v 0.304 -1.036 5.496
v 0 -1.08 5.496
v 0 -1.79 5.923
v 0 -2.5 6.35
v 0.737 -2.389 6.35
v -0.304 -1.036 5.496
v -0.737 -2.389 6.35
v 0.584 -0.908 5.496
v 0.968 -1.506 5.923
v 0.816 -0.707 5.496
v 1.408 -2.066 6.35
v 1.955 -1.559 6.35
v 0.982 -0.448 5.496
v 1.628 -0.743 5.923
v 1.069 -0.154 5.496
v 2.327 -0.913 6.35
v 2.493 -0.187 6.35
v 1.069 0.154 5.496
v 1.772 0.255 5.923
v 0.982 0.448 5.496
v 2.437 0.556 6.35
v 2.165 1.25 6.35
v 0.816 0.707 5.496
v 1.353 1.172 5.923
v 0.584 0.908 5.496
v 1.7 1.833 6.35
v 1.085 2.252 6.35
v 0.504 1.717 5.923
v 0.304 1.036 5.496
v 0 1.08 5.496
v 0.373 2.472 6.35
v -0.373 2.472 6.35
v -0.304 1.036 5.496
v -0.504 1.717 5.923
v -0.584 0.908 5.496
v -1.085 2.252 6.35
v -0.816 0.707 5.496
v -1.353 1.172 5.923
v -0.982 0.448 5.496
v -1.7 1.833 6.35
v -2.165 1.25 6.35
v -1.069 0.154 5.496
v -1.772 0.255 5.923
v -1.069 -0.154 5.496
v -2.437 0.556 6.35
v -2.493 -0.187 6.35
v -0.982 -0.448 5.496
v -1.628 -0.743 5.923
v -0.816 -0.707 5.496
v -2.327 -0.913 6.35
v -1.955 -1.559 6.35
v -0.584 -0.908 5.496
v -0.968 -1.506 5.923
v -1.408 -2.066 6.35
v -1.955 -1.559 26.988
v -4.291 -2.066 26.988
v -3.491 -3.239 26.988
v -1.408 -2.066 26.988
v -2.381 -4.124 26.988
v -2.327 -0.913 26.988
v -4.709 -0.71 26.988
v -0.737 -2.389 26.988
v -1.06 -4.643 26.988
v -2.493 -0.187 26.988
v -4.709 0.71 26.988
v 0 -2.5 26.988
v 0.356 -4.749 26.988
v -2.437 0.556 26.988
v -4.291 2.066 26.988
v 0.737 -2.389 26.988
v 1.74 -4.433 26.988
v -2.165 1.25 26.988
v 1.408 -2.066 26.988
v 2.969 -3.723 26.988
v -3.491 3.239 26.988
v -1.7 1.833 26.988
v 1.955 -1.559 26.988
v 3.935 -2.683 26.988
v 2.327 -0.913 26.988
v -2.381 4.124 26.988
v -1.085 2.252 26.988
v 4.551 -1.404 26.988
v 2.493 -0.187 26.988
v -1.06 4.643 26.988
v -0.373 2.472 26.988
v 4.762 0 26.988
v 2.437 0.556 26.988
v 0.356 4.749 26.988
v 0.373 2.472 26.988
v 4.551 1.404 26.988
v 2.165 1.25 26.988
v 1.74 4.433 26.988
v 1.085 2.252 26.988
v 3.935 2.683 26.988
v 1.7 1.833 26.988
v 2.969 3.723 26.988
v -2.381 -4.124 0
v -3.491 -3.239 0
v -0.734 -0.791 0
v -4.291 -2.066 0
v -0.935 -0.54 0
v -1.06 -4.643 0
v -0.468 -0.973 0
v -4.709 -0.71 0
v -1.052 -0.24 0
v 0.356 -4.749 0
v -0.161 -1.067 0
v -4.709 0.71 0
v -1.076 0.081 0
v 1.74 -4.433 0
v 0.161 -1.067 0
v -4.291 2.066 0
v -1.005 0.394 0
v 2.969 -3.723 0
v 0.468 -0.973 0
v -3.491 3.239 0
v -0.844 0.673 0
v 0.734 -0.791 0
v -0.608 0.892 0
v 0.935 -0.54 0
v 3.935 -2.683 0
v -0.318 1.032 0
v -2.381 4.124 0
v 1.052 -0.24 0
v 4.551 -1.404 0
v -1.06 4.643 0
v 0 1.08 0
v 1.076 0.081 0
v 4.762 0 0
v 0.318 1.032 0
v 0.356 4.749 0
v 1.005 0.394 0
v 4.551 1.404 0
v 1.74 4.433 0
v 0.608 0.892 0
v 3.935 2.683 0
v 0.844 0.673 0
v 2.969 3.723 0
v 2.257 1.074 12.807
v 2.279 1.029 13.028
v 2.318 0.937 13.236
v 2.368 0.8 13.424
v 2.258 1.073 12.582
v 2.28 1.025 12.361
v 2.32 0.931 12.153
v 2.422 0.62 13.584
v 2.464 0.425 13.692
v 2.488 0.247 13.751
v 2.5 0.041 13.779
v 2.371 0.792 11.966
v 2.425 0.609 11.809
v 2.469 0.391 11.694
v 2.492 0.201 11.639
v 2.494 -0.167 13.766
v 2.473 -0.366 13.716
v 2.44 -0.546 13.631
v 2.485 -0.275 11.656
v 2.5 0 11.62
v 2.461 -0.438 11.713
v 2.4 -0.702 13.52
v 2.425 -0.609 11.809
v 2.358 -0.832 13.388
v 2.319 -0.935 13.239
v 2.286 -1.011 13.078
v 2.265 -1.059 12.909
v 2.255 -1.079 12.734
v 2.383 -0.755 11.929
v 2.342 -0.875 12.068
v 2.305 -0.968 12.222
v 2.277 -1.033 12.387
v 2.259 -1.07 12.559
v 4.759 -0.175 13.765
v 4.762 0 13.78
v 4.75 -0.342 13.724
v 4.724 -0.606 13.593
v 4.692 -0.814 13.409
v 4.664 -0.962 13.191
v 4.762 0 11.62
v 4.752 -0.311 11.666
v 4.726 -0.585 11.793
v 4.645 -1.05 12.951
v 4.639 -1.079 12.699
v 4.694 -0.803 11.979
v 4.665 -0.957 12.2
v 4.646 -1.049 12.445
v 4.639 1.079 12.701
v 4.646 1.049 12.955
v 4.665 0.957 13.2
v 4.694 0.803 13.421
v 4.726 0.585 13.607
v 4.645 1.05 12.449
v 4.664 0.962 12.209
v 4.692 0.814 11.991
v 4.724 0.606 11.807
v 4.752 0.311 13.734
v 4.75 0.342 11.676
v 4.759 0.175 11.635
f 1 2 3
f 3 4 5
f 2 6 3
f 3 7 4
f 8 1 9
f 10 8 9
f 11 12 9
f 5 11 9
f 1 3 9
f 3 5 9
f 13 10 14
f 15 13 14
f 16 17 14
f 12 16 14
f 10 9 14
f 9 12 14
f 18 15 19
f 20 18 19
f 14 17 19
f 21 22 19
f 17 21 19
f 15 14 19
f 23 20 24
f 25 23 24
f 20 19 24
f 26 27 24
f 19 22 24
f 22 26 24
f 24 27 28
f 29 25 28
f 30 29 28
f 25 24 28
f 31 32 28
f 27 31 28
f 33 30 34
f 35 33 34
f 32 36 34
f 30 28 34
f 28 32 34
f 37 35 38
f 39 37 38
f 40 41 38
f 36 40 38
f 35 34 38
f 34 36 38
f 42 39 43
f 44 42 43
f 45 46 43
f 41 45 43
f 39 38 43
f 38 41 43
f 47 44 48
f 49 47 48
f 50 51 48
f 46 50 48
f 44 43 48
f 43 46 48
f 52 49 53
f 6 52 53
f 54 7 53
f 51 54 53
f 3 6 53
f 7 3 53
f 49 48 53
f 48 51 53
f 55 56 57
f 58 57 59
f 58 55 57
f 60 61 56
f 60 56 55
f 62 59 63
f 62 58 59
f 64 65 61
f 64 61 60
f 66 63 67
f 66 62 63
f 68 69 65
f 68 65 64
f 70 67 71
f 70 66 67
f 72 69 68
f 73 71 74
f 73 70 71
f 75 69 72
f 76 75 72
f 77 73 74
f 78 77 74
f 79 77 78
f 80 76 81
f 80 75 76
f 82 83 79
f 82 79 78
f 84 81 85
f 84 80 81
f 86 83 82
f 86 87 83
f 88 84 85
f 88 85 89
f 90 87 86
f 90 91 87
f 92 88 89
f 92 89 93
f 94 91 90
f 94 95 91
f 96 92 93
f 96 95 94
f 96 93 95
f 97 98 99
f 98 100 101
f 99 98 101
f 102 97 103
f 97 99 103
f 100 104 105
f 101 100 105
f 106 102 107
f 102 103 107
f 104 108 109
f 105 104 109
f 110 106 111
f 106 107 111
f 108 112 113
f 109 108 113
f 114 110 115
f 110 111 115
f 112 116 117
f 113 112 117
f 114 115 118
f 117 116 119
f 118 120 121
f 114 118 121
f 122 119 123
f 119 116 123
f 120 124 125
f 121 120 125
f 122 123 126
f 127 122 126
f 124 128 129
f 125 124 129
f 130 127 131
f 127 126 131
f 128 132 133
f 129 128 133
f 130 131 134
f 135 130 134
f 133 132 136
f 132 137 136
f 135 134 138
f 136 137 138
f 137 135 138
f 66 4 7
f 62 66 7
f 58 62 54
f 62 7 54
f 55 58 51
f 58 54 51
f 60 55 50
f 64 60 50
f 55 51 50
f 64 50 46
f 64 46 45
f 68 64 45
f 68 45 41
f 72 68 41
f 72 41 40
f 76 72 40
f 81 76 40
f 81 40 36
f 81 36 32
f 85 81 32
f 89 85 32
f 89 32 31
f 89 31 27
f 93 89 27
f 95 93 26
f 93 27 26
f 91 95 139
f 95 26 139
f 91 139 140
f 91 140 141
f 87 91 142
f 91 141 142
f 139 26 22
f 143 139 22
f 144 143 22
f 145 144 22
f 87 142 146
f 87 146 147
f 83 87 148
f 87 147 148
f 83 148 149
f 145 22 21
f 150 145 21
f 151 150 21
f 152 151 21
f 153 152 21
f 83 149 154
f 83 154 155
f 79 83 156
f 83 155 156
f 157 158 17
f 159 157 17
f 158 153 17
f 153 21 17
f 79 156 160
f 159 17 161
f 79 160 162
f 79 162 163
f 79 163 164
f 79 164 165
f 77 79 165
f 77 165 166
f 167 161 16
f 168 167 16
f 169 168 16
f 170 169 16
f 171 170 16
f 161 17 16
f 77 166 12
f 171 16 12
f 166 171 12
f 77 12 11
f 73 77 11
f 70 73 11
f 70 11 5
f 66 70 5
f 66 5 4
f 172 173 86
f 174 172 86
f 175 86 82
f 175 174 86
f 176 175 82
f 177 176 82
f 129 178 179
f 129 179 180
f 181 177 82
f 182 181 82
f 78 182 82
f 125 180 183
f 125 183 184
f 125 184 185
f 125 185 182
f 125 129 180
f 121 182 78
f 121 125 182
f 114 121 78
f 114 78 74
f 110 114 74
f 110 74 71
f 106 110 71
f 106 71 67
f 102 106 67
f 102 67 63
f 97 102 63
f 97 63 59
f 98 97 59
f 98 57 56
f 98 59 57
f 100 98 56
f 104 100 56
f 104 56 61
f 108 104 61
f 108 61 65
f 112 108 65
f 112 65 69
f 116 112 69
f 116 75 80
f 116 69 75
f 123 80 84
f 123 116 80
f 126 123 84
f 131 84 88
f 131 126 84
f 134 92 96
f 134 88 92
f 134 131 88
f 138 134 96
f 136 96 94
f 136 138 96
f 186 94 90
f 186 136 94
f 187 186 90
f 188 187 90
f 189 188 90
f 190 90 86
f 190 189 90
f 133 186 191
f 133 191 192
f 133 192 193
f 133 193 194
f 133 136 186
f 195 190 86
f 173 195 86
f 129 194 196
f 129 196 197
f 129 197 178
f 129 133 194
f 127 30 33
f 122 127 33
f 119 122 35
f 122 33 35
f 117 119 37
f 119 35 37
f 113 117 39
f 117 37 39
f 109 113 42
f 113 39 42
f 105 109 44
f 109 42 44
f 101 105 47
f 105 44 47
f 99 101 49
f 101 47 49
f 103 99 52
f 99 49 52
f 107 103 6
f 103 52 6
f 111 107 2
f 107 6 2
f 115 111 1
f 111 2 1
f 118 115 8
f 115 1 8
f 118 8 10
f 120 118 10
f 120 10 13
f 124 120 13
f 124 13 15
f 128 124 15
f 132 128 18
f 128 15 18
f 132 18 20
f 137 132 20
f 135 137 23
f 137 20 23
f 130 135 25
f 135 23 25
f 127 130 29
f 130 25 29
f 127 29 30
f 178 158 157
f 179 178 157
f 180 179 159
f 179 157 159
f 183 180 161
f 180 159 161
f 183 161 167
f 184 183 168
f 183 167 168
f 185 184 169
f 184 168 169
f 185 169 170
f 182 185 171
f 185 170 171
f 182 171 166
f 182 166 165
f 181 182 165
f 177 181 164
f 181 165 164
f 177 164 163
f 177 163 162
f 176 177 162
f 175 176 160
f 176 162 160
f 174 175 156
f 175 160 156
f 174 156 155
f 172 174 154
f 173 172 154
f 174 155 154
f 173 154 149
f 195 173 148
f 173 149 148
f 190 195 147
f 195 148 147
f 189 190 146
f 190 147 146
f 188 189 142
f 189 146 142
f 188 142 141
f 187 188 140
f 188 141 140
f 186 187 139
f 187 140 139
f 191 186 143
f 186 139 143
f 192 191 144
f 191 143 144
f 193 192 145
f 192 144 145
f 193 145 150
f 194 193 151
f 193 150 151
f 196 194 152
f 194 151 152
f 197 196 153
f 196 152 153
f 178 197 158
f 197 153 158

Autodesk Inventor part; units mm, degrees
ref_plane "XZ Plane" through (0, 0, 0) normal (0, 1, 0) x (-1, 0, 0)
ref_plane "XY Plane" through (0, 0, 0) normal (0, 0, 1) x (1, 0, 0)
sketch "Sketch1" plane through (0, 0, 0) normal (0, 0, 1) x (1, 0, 0)
  circle A0 centre (0, 0) radius 4.7625
  dimension "d0" = 9.525
extrude "Extrusion1" add sketch "Sketch1" along normal blind 26.9875
sketch "Sketch2" plane through (0, 0, 26.9875) normal (0, 0, 1) x (1, 0, 0)
  point P0 (0, 0)
  point P1 (0, 0)
hole "Hole1" at (0, 0, 26.9875) direction (0, 0, -1) diameter 5 depth 20.6375 tip angle 118
sketch "Sketch3" plane through (0, 0, 0) normal (0, 0, -1) x (-1, 0, 0)
  circle A0 centre (0, 0) radius 4.7625 projected
hole "Hole2" at (0, 0, 0) direction (0, 0, 1) diameter 2.159 depth 8.8646 tip angle 118
ref_plane "Work Plane1" through (4.7625, 0, 0) normal (1, 0, 0) x (0, 1, 0)
sketch "Sketch4" plane through (4.7625, 0, 0) normal (1, 0, 0) x (0, 1, 0)
  line L0 (-2.5, 26.9875) -> (2.5, 26.9875) projected
  line L1 (0, 26.9875) -> (0, 12.7)
  point P0 (0, 0)
  dimension "d18" = 14.2875
hole "Hole3" at (4.7625, 0, 12.7) direction (-1, 0, 0) diameter 2.159 depth 3.81 tip angle 118
properties part number "coupler"
